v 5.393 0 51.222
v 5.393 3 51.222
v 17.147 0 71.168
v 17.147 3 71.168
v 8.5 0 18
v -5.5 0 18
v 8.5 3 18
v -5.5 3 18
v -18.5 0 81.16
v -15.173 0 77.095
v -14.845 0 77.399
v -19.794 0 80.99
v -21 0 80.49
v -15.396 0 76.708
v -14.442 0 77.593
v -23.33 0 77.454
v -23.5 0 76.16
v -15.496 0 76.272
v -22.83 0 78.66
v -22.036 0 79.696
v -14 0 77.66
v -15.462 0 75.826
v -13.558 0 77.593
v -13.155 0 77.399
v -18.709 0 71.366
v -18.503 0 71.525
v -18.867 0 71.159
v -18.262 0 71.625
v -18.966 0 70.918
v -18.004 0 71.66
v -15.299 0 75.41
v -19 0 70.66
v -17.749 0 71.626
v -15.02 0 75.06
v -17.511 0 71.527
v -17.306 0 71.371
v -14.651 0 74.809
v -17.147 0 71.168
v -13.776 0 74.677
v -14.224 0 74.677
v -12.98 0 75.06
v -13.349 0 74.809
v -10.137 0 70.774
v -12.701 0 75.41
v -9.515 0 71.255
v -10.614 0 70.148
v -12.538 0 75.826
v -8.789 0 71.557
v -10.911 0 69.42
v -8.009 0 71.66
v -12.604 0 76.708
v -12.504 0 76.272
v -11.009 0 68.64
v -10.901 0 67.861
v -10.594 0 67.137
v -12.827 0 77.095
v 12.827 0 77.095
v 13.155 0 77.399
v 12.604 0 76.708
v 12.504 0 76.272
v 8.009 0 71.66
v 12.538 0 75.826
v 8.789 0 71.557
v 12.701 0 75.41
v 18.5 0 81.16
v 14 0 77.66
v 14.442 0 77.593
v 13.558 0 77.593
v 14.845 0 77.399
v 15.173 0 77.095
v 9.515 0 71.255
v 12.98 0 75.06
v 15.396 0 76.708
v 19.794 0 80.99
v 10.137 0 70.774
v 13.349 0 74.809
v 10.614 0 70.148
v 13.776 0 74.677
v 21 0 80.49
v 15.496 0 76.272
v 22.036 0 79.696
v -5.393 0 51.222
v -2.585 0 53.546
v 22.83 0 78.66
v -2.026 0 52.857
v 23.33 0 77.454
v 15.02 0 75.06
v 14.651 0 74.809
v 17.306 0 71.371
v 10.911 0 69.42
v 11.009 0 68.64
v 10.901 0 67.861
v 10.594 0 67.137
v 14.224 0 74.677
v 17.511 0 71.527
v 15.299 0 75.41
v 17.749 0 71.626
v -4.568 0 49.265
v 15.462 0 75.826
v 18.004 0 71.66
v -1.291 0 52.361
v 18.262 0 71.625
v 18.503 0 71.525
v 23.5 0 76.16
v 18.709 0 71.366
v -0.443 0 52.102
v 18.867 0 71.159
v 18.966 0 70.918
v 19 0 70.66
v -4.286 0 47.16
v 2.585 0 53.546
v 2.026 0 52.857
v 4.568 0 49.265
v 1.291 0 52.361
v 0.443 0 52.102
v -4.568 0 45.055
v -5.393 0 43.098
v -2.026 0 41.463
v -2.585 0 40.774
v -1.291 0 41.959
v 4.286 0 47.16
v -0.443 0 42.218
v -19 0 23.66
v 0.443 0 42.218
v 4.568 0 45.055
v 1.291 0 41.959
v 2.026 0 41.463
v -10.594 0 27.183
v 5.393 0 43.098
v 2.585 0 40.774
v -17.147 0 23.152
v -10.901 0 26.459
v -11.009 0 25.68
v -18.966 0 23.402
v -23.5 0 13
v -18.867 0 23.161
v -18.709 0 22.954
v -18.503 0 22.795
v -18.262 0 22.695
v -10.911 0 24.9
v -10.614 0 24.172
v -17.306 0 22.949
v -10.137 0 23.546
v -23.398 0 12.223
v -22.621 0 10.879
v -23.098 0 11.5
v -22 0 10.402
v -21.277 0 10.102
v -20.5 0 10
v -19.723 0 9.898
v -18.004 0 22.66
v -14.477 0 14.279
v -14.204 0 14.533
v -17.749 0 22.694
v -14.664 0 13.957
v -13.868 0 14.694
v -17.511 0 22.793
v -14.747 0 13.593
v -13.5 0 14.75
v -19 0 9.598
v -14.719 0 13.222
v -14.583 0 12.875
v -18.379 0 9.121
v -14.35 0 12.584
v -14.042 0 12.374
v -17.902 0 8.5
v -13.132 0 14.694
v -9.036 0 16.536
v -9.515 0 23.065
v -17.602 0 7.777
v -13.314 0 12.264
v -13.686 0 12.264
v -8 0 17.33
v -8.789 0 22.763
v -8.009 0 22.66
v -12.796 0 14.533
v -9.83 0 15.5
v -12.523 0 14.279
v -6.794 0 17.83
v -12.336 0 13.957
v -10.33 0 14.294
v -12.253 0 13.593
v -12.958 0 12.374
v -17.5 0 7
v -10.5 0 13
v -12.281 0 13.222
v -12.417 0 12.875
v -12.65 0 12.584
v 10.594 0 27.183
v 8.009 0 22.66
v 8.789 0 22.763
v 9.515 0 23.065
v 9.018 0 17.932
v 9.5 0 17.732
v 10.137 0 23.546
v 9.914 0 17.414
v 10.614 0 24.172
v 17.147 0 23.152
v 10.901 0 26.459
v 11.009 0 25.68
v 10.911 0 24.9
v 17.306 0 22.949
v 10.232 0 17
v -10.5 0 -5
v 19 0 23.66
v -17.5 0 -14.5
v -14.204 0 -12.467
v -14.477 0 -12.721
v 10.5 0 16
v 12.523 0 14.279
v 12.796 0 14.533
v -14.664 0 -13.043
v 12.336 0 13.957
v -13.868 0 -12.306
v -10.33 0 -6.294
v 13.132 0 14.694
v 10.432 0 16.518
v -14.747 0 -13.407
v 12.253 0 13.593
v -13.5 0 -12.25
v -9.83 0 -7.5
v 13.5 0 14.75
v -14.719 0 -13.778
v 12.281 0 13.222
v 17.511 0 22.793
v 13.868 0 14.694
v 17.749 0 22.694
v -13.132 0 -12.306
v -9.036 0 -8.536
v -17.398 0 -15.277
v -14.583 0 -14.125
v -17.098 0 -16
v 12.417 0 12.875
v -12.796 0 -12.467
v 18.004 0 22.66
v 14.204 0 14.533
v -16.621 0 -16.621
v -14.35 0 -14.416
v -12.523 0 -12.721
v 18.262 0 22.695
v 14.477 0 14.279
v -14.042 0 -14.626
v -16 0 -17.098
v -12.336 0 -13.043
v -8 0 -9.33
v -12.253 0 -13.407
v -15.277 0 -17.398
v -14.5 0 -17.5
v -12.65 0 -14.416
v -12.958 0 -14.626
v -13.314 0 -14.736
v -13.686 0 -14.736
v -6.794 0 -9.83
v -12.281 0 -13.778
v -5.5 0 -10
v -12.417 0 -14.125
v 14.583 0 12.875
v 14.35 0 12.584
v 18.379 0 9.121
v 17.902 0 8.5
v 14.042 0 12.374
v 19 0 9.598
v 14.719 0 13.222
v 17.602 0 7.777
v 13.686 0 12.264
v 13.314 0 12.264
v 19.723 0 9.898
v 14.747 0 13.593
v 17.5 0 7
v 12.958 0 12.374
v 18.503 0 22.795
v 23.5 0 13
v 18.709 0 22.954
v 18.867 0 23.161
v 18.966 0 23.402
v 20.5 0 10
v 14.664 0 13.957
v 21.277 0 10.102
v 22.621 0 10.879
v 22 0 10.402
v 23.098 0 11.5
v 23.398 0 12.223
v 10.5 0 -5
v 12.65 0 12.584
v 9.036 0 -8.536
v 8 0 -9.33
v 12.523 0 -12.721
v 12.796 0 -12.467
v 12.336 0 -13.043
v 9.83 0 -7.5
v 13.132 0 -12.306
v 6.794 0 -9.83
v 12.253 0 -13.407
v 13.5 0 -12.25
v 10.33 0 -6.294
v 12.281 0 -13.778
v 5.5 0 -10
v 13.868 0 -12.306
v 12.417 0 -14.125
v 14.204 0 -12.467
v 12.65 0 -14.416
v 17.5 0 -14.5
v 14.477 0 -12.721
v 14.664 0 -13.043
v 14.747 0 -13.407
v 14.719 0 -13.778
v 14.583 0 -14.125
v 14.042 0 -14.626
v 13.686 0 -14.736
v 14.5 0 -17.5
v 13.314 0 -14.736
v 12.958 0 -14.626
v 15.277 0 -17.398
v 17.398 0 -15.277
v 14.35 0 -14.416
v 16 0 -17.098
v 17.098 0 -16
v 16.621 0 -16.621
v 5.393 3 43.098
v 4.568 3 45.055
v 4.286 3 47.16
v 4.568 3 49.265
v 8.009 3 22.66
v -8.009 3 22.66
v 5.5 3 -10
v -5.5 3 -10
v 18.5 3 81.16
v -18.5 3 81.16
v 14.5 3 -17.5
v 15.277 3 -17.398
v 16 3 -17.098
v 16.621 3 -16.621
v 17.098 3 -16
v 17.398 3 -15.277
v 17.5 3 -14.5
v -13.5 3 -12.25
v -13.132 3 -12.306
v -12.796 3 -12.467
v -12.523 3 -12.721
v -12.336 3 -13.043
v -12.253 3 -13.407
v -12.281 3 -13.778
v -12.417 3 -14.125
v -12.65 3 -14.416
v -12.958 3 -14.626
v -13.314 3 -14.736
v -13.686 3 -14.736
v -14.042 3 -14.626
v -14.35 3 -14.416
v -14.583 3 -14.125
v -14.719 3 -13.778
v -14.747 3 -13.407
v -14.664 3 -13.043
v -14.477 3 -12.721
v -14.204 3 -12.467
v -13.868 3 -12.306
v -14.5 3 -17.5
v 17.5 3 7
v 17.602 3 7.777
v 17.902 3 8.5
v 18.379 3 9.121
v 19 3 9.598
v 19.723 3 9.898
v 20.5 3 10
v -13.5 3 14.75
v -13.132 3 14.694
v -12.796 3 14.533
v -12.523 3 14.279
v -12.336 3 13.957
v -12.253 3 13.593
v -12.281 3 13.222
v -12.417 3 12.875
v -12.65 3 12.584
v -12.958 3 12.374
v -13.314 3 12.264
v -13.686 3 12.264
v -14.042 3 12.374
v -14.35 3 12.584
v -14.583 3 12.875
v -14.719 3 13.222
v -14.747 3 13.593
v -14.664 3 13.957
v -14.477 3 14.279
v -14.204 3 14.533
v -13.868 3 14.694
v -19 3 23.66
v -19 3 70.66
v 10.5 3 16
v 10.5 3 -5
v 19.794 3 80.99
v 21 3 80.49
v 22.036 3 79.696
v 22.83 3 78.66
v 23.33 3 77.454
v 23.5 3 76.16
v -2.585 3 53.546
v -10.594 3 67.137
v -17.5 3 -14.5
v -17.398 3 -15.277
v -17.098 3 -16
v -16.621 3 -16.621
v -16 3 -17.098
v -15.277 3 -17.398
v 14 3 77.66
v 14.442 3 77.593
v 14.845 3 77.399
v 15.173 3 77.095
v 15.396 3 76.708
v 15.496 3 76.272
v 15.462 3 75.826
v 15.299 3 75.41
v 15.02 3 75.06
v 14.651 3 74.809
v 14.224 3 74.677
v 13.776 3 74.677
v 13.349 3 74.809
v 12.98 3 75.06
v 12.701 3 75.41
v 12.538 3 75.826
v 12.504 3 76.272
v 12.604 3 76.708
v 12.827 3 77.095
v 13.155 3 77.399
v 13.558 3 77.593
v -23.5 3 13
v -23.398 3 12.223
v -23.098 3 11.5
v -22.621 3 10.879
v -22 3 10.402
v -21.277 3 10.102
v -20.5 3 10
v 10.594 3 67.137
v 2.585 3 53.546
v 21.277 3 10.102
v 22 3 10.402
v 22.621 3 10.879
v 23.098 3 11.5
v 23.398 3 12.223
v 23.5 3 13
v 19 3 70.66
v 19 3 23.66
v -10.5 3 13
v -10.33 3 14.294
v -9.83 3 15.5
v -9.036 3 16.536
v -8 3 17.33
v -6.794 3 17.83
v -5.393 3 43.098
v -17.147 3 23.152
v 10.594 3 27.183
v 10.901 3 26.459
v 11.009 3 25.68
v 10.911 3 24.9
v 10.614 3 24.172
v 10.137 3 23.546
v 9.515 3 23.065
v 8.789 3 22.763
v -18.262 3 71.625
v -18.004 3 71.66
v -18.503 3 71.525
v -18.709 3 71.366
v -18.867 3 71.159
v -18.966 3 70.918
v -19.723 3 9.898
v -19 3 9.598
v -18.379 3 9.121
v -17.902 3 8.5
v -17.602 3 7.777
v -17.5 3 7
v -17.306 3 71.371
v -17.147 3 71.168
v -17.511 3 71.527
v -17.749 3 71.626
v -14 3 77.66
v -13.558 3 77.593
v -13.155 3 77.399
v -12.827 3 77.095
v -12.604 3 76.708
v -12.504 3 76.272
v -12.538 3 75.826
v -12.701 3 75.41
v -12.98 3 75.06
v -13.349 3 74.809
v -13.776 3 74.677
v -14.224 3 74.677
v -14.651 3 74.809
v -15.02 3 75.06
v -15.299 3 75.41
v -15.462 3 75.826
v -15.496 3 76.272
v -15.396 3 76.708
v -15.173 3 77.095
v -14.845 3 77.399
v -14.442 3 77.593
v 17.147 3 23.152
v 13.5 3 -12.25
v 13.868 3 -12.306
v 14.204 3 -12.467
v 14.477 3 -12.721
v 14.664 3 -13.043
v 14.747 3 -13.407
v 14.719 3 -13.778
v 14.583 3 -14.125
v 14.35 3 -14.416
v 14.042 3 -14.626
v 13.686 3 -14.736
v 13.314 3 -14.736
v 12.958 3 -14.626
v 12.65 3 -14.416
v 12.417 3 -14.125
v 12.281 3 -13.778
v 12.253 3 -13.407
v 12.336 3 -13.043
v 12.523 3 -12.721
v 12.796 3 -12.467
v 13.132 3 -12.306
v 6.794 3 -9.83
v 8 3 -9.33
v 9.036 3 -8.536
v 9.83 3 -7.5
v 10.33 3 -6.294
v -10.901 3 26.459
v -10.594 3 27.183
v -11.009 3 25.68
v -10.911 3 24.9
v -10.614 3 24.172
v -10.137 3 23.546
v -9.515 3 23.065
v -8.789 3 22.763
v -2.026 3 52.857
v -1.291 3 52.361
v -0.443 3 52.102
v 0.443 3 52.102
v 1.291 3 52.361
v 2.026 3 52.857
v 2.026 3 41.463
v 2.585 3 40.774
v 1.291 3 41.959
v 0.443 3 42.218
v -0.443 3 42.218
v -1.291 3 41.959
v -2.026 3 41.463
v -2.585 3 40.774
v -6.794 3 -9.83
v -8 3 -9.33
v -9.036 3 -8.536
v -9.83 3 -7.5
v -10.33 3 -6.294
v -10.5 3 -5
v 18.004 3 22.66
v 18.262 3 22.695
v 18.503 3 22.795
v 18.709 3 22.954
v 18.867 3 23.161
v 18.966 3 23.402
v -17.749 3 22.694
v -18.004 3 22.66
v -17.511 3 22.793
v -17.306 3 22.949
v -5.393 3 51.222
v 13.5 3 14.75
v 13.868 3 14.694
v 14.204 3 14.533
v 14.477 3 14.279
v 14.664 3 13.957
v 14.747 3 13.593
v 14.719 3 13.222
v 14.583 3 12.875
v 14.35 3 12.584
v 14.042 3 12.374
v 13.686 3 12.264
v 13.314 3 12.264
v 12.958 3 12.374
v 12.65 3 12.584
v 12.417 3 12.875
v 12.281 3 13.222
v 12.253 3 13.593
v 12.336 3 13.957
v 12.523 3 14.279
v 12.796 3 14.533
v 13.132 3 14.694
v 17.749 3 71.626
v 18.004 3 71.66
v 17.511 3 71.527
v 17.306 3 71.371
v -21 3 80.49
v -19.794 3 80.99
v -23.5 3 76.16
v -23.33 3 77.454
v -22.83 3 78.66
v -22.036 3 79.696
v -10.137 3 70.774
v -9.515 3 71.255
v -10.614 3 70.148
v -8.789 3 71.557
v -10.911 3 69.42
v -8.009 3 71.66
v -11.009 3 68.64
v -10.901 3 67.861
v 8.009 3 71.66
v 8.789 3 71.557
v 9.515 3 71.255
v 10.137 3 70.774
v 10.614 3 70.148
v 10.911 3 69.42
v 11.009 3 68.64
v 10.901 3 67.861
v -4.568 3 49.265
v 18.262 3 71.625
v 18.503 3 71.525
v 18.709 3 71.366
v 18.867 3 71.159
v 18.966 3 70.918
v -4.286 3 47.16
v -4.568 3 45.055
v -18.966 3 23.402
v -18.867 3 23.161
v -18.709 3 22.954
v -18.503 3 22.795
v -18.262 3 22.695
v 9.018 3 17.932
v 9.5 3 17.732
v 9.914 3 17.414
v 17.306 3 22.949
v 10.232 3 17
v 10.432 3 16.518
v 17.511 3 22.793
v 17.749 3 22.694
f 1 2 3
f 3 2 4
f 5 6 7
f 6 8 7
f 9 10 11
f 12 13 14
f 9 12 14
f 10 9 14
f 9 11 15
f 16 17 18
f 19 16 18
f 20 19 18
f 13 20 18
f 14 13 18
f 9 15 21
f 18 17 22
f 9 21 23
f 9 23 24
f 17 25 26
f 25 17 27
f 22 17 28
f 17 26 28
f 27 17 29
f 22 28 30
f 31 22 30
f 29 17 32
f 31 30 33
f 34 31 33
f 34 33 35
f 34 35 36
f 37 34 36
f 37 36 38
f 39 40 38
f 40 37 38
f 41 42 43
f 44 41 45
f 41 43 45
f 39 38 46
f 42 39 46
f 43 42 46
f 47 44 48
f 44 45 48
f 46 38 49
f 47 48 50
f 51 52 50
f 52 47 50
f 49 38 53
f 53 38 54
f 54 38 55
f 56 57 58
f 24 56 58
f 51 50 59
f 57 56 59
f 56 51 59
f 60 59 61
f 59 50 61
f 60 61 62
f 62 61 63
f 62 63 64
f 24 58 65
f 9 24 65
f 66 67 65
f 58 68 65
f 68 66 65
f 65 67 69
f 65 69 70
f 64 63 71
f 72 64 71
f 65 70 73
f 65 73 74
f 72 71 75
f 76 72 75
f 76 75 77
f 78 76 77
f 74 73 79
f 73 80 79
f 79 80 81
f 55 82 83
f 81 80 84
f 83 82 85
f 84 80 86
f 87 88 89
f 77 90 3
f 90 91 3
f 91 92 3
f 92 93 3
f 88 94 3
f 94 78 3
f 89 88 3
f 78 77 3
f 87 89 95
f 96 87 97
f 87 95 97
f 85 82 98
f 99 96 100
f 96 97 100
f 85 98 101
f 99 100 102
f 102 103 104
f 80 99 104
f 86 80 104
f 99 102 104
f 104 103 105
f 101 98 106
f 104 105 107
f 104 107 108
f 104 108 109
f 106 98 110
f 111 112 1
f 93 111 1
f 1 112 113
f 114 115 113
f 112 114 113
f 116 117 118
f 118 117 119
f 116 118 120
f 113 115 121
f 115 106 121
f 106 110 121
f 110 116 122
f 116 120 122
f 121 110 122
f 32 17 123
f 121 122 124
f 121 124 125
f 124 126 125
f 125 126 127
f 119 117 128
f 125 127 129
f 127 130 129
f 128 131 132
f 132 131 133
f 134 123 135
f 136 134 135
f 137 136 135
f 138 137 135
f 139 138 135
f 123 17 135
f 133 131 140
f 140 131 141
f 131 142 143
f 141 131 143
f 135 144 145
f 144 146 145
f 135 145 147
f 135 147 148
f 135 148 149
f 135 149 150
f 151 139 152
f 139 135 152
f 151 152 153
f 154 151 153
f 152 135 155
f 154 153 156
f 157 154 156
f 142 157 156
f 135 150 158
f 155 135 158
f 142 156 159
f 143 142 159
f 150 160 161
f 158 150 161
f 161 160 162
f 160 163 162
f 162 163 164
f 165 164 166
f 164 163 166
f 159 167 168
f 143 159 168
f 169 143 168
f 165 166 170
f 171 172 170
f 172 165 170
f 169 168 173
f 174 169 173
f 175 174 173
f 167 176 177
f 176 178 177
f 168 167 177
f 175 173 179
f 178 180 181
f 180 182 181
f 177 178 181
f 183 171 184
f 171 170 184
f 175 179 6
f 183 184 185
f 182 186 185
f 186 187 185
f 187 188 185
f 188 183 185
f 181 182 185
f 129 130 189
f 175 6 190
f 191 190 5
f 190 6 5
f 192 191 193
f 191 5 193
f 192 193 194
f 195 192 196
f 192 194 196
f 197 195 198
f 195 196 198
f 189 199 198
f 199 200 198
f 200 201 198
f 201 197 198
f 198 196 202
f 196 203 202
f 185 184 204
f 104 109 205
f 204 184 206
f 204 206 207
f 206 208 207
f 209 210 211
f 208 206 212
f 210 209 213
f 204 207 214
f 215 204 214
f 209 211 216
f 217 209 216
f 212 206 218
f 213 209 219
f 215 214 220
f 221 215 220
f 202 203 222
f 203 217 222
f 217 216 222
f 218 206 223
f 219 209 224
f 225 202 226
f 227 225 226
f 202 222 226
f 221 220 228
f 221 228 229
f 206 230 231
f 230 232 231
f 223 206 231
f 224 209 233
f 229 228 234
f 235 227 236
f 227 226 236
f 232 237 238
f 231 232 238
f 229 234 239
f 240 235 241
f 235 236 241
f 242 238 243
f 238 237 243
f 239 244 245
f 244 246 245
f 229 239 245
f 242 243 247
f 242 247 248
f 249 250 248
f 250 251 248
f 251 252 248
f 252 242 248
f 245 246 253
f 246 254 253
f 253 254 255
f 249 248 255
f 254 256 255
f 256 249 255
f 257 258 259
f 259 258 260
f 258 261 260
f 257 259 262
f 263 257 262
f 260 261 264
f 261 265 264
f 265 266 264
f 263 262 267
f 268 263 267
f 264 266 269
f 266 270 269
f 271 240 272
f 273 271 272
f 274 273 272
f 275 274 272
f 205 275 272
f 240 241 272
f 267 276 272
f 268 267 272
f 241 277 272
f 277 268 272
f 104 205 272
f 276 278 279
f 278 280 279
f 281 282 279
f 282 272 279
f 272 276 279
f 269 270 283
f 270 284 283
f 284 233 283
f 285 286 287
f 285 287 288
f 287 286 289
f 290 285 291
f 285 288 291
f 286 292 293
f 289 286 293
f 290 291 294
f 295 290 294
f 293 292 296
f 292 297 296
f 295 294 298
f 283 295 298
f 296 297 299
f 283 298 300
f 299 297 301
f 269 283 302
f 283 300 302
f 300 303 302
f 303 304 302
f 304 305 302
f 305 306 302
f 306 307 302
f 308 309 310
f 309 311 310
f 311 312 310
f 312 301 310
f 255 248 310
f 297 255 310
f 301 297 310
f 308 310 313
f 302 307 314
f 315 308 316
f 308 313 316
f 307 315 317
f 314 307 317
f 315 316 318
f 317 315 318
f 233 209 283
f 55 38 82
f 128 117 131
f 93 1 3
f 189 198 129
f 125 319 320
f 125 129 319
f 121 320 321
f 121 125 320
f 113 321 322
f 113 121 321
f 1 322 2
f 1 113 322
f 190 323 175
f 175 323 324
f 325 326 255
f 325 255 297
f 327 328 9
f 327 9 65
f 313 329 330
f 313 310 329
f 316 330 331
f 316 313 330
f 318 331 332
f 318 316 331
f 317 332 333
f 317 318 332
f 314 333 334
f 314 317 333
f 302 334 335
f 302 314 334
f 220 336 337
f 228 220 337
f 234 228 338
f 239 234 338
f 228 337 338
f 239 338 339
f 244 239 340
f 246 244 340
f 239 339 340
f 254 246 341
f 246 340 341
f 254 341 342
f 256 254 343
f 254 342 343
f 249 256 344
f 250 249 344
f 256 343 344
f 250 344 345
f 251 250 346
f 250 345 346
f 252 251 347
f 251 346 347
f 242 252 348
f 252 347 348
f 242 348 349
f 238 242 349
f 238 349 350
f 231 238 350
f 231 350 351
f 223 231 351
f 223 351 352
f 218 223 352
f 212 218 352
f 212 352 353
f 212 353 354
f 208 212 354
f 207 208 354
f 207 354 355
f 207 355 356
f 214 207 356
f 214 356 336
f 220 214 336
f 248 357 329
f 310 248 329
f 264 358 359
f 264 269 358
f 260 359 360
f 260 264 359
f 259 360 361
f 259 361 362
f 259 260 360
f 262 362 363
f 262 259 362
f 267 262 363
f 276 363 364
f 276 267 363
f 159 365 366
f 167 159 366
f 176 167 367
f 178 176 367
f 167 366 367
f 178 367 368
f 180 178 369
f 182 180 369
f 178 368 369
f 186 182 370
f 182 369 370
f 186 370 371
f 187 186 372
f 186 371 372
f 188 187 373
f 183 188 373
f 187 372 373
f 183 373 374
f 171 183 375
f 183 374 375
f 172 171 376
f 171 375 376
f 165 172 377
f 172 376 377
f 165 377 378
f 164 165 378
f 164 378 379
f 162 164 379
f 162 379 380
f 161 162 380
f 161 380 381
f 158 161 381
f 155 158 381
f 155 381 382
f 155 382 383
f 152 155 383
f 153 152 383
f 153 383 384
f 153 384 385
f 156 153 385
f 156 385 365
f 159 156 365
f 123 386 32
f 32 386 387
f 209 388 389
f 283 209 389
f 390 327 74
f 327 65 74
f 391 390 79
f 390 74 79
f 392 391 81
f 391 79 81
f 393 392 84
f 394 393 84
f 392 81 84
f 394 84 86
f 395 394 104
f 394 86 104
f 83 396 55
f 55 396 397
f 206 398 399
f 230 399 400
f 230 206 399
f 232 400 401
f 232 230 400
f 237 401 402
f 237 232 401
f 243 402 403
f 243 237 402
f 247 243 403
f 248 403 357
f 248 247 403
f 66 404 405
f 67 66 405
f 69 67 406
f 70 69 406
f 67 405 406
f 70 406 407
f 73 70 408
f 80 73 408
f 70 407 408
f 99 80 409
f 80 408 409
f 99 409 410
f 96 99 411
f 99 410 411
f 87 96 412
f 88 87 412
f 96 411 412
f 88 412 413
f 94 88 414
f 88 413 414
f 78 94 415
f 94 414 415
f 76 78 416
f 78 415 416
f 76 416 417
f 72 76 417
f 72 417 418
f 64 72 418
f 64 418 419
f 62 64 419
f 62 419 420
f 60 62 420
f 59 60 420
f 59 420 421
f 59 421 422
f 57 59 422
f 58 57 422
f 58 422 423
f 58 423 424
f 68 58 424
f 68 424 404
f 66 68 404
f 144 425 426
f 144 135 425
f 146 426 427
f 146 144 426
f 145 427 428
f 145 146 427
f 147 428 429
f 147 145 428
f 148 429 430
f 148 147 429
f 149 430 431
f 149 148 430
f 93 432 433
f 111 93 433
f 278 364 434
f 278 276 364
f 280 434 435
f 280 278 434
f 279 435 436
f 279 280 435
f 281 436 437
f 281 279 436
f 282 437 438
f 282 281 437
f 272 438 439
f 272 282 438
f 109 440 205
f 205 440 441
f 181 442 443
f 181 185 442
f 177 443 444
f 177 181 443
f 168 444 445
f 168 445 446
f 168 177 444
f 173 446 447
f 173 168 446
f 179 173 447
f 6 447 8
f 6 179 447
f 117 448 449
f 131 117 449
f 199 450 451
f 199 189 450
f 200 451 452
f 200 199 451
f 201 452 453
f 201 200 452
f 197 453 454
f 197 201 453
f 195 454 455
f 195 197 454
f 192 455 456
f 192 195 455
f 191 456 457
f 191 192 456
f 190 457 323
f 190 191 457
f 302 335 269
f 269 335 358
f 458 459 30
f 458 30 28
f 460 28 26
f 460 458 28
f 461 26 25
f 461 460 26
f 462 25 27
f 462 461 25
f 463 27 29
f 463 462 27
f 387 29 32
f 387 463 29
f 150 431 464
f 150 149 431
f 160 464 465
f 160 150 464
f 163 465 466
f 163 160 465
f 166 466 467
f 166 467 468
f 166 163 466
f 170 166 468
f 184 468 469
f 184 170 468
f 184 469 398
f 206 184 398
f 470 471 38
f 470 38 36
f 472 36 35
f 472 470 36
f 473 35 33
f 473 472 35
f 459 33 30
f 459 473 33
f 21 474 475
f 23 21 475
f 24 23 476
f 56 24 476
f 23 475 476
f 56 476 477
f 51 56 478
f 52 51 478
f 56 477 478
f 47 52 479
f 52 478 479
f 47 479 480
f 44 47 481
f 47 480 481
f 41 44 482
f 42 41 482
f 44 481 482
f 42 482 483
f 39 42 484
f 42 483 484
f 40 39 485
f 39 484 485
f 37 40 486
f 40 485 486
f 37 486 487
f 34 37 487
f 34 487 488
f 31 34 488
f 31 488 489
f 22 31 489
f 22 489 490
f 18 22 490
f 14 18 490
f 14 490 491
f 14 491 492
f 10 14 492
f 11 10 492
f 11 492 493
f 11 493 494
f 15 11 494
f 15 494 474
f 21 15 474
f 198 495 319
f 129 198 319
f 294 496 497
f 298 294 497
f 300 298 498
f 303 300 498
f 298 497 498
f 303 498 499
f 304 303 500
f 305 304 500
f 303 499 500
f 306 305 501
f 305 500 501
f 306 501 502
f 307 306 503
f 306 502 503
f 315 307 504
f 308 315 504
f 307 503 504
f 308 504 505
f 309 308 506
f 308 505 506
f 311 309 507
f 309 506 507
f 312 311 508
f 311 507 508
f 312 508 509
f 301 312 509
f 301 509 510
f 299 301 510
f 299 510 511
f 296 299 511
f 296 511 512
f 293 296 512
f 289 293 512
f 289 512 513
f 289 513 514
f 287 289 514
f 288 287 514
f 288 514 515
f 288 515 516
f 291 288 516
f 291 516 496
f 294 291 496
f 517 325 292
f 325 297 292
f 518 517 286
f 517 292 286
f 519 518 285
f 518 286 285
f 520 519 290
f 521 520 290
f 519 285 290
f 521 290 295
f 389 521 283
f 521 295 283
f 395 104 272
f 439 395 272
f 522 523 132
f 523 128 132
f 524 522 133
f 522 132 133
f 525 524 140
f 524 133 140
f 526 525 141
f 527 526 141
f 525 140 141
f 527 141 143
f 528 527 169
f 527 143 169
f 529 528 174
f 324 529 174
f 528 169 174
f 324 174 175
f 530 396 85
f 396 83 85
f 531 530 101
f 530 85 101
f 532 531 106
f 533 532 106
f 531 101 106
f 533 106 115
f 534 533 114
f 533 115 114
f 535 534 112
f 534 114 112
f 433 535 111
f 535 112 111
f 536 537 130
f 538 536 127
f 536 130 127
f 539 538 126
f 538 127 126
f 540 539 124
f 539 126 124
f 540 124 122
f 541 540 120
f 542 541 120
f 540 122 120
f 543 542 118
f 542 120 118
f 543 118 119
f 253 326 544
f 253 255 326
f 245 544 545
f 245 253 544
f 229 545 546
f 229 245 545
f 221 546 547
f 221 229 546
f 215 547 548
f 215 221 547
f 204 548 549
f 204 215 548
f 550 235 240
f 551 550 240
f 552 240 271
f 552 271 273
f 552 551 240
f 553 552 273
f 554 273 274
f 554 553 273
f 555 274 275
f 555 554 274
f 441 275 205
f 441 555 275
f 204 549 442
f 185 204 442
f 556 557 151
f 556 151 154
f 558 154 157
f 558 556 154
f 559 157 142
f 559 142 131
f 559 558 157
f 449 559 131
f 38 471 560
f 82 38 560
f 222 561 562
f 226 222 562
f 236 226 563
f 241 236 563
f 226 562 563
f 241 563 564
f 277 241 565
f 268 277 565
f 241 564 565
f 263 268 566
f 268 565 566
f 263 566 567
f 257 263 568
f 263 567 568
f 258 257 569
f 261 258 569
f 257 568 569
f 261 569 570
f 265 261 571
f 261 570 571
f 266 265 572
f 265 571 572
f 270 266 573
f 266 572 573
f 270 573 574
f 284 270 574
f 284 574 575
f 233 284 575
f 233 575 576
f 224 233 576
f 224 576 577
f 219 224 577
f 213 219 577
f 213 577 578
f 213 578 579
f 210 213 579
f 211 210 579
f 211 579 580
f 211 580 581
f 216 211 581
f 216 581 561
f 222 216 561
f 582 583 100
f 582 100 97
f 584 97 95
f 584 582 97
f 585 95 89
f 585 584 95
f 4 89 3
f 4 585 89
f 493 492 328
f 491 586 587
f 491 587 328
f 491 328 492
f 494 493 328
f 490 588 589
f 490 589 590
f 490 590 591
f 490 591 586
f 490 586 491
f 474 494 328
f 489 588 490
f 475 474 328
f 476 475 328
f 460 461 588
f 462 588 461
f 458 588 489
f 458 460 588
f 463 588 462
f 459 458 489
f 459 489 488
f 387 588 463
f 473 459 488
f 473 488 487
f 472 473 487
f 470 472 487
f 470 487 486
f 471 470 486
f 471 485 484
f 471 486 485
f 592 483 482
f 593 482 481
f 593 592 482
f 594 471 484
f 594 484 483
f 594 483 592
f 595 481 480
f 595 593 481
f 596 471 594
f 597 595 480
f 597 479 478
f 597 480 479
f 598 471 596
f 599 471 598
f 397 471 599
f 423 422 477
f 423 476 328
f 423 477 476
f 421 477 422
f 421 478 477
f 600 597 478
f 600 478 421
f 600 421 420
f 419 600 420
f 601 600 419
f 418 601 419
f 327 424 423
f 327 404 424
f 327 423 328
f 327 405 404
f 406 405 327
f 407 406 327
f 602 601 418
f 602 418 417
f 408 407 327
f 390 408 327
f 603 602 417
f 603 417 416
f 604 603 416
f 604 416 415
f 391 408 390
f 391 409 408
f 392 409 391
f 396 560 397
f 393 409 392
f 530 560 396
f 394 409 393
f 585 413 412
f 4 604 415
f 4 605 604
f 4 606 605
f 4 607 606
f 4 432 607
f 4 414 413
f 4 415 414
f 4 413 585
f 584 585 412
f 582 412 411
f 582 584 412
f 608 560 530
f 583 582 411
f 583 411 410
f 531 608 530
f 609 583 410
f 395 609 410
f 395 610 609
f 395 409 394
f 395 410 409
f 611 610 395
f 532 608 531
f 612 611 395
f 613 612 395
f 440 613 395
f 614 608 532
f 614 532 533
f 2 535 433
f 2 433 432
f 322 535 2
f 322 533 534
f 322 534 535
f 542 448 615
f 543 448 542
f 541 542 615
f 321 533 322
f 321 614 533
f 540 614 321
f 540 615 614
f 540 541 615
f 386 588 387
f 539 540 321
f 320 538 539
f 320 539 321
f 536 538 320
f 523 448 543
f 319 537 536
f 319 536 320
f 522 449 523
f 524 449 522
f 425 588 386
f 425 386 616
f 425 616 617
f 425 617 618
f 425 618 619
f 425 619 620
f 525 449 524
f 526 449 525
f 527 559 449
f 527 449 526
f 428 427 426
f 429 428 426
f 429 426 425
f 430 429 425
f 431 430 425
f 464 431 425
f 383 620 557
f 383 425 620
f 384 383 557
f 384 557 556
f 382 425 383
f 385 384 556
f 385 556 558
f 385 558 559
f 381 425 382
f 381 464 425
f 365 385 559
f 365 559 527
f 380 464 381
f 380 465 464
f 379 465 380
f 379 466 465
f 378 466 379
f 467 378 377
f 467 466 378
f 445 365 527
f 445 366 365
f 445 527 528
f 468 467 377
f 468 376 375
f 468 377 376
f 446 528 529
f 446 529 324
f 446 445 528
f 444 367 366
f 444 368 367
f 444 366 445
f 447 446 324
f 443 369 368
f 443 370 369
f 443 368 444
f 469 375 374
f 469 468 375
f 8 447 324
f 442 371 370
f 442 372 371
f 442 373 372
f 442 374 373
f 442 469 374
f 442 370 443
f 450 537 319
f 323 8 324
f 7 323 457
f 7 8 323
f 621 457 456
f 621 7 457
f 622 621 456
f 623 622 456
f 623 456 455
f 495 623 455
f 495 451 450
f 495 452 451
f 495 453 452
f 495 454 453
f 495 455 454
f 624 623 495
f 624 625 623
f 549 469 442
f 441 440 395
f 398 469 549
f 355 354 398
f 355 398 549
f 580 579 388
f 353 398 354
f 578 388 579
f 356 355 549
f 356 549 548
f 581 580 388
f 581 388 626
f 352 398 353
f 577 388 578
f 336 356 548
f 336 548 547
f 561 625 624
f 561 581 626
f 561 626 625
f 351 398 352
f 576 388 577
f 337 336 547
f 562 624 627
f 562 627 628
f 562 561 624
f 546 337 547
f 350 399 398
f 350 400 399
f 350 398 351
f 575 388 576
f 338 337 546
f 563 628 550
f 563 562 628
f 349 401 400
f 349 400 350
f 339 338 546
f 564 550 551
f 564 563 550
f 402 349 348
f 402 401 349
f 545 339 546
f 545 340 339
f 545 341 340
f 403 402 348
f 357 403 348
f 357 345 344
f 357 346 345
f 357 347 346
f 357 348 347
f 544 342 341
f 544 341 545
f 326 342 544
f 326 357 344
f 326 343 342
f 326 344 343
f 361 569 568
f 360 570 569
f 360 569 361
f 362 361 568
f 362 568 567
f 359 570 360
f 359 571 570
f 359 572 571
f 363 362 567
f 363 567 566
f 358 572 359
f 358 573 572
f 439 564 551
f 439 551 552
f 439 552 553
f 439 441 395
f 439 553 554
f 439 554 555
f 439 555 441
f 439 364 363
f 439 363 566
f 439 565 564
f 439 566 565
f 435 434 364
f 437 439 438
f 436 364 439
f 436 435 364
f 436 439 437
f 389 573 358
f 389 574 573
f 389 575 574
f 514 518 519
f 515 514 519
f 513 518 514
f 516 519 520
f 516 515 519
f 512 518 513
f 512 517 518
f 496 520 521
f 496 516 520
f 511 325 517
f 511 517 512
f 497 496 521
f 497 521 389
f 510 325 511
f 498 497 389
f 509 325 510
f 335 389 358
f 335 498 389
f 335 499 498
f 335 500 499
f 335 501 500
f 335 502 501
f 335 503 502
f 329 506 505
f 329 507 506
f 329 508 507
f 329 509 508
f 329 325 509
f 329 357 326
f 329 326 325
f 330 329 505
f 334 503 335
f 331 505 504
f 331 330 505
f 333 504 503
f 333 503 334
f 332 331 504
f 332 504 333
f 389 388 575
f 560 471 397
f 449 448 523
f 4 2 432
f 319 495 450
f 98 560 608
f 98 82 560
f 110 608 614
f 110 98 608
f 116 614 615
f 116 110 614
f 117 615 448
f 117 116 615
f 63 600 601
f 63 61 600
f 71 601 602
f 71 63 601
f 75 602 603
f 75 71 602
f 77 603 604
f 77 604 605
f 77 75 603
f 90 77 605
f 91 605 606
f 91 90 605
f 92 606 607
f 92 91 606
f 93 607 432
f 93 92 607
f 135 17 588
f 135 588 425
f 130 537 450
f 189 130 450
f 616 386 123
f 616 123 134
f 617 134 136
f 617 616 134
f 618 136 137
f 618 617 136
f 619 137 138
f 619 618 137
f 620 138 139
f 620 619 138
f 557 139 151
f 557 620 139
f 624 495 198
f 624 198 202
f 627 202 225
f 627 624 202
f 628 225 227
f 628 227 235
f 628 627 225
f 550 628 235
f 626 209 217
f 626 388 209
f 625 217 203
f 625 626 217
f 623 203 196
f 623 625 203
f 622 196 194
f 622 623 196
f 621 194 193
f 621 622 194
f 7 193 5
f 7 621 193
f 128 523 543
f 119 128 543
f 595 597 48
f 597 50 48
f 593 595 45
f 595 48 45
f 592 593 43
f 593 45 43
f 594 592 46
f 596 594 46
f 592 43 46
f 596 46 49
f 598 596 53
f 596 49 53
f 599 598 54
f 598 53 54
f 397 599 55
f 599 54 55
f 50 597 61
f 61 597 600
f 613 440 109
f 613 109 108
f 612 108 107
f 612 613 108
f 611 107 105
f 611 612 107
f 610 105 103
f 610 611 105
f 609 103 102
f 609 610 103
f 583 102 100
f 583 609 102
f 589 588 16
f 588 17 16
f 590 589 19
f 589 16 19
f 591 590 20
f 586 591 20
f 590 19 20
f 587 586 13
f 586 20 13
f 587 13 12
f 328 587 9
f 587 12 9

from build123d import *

# Parameters (mm, degrees)
SKETCH_1_W          = 47
SKETCH_1_H          = 106.16
SKETCH_1_W_2        = 10.5
SKETCH_1_H_2        = 10
EXTRUDE_1_DEPTH     = 3
SKETCH_4_R          = 1.5
SKETCH_4_W          = 47
SKETCH_4_H          = 5
CUT_EXTRUDE_2_DEPTH = 4
SKETCH_10_R         = 1.25
CUT_EXTRUDE_4_DEPTH = 10
SKETCH_16_W         = 17.5
SKETCH_16_H         = 2.5
CUT_EXTRUDE_5_DEPTH = 10
FILLET_1_R          = 3
CUT_EXTRUDE_7_DEPTH = 10
FILLET_2_R          = 1
FILLET_3_R          = 8
FILLET_4_R          = 3
FILLET_5_R          = 5
SKETCH_17_W         = 21
SKETCH_17_H         = 20
SKETCH_17_H_2       = 8
CUT_EXTRUDE_8_DEPTH = 10
FILLET_6_R          = 5
FILLET_7_R          = 2


# Some blends are built 0.0001 mm under size
with BuildPart() as part:
    # 草图1 → 凸台-拉伸1 (new body)
    with BuildSketch(Plane(origin=(0, 0, 0), x_dir=(1, 0, 0), z_dir=(0, 1, 0))):
        with Locations((0, -33.08)):
            Rectangle(SKETCH_1_W, SKETCH_1_H)
        with Locations((5.25, -13)):
            Rectangle(SKETCH_1_W_2, SKETCH_1_H_2, mode=Mode.SUBTRACT)
    extrude(amount=EXTRUDE_1_DEPTH)

    # 草图4 → 切除-拉伸2 (cut)
    with BuildSketch(Plane(origin=(0, 3, 0), x_dir=(1, 0, 0), z_dir=(0, 1, 0))):
        with Locations(Location((-14, -76.16, 0), (0, 0, 270))):
            Circle(SKETCH_4_R)
        with Locations(Location((14, -76.16, 0), (0, 0, 270))):
            Circle(SKETCH_4_R)
        with Locations((0, -83.66)):
            Rectangle(SKETCH_4_W, SKETCH_4_H)
    extrude(amount=-CUT_EXTRUDE_2_DEPTH, mode=Mode.SUBTRACT)

    # 草图10 → 切除-拉伸4 (cut)
    with BuildSketch(Plane(origin=(0, 3, 0), x_dir=(1, 0, 0), z_dir=(0, 1, 0))):
        with Locations(Location((13.5, 13.5, 0), (0, 0, 270))):
            Circle(SKETCH_10_R)
        with Locations(Location((13.5, -13.5, 0), (0, 0, 270))):
            Circle(SKETCH_10_R)
        with Locations(Location((-13.5, -13.5, 0), (0, 0, 270))):
            Circle(SKETCH_10_R)
        with Locations(Location((-13.5, 13.5, 0), (0, 0, 270))):
            Circle(SKETCH_10_R)
    extrude(amount=-CUT_EXTRUDE_4_DEPTH, mode=Mode.SUBTRACT)

    # 草图16 → 切除-拉伸5 (cut)
    with BuildSketch(Plane(origin=(0, 3, 0), x_dir=(1, 0, 0), z_dir=(0, 1, 0))):
        Polygon((-17.5, 17.5), (-17.5, 20), (-23.5, 20), (-23.5, -10), (-17.5, -10), align=None)
        Polygon((23.5, 20), (17.5, 20), (17.5, 17.5), (17.5, -10), (23.5, -10), align=None)
        with Locations((8.75, 18.75)):
            Rectangle(SKETCH_16_W, SKETCH_16_H)
        with Locations((-8.75, 18.75)):
            Rectangle(SKETCH_16_W, SKETCH_16_H)
    extrude(amount=-CUT_EXTRUDE_5_DEPTH, mode=Mode.SUBTRACT)

    # 圆角1
    fillet_1_edges = [part.edges().sort_by_distance(p)[0] for p in [
        (-17.5, 1.5, -17.5),
        (17.5, 1.5, -17.5),
        (23.5, 1.5, 10),
        (-23.5, 1.5, 10),
        (17.5, 1.5, 10),
        (-17.5, 1.5, 10),
    ]]
    fillet(fillet_1_edges, radius=FILLET_1_R - 0.0001)  # a hair under: the kernel refuses the full size

    # 草图9 → 切除-拉伸7 (cut)
    with BuildSketch(Plane(origin=(0, 3, 0), x_dir=(1, 0, 0), z_dir=(0, 1, 0))):
        Polygon((-3, -47.16), (-17.4375, -22.66), (-19, -22.66), (-19, -71.66), (-17.4375, -71.66), align=None)
        Polygon((0, -45.16), (13.258928571, -22.66), (-13.258928571, -22.66), align=None)
        Polygon((19, -22.66), (17.4375, -22.66), (3, -47.16), (17.4375, -71.66), (19, -71.66), align=None)
        Polygon((-13.258928571, -71.66), (13.258928571, -71.66), (0, -49.16), align=None)
    extrude(amount=-CUT_EXTRUDE_7_DEPTH, mode=Mode.SUBTRACT)

    # 圆角2
    # the kernel refuses this fillet: 1 mm, written as the material it adds along each edge
    with BuildSketch(Plane(origin=(-17.4375, 3, 71.66), x_dir=(-1, 0, 0), z_dir=(0, -1, 0)), Plane(origin=(17.4375, 3, 71.66), x_dir=(-0.507692307692314, 0, -0.8615384615384579), z_dir=(0, -1, 0)), Plane(origin=(17.4375, 3, 22.66), x_dir=(1, 0, 0), z_dir=(0, -1, 0)), Plane(origin=(-17.4375, 3, 22.66), x_dir=(0.5076923076923058, 0, 0.8615384615384627), z_dir=(0, -1, 0))) as fillet_2_piece_1:
        with BuildLine():
            CenterArc((FILLET_2_R * 0.571428571429, FILLET_2_R), FILLET_2_R, 210.510237406, 59.489762594)
            Line((-FILLET_2_R * 0.29010989011, FILLET_2_R * 0.492307692308), (0, 0))
            Line((0, 0), (FILLET_2_R * 0.571428571429, 0))
        make_face()
    extrude(amount=3)
    with BuildSketch(Plane(origin=(-19, 3, 71.66), x_dir=(0, 0, -1), z_dir=(0, -1, 0)), Plane(origin=(19, 3, 71.66), x_dir=(-1, 0, 0), z_dir=(0, -1, 0)), Plane(origin=(-19, 3, 22.66), x_dir=(1, 0, 0), z_dir=(0, -1, 0))) as fillet_2_piece_2:
        with BuildLine():
            CenterArc((FILLET_2_R, FILLET_2_R), FILLET_2_R, 180, 90)
            Line((0, FILLET_2_R), (0, 0))
            Line((0, 0), (FILLET_2_R, 0))
        make_face()
    extrude(amount=3)
    with BuildSketch(Plane(origin=(19, 3, 22.66), x_dir=(-1, 0, 0), z_dir=(0, -1, 0))) as fillet_2_piece_3:
        with BuildLine():
            CenterArc((FILLET_2_R, -FILLET_2_R), FILLET_2_R, 90, 90)
            Line((0, -FILLET_2_R), (0, 0))
            Line((0, 0), (FILLET_2_R, 0))
        make_face()
    extrude(amount=3)

    # 圆角3
    fillet_3_edges = [part.edges().sort_by_distance(p)[0] for p in [
        (3, 1.5, 47.16),
        (-3, 1.5, 47.16),
    ]]
    fillet(fillet_3_edges, radius=FILLET_3_R)

    # 圆角4
    fillet_4_edges = [part.edges().sort_by_distance(p)[0] for p in [
        (-13.258928571, 1.5, 22.66),
        (13.258928571, 1.5, 22.66),
        (0, 1.5, 45.16),
        (-13.258928571, 1.5, 71.66),
        (0, 1.5, 49.16),
        (13.258928571, 1.5, 71.66),
    ]]
    fillet(fillet_4_edges, radius=FILLET_4_R)

    # 圆角5
    fillet_5_edges = [part.edges().sort_by_distance(p)[0] for p in [
        (-23.5, 1.5, 81.16),
        (23.5, 1.5, 81.16),
    ]]
    fillet(fillet_5_edges, radius=FILLET_5_R)

    # 草图17 → 切除-拉伸8 (cut)
    with BuildSketch(Plane(origin=(0, 3, 0), x_dir=(1, 0, 0), z_dir=(0, 1, 0))):
        Rectangle(SKETCH_17_W, SKETCH_17_H)
        with Locations((0, -14)):
            Rectangle(SKETCH_17_W, SKETCH_17_H_2)
    extrude(amount=-CUT_EXTRUDE_8_DEPTH, mode=Mode.SUBTRACT)

    # 圆角6
    fillet_6_edges = [part.edges().sort_by_distance(p)[0] for p in [
        (-10.5, 1.5, 18),
        (-10.5, 1.5, -10),
        (10.5, 1.5, -10),
    ]]
    fillet(fillet_6_edges, radius=FILLET_6_R)

    # 圆角7
    fillet_7_edges = [part.edges().sort_by_distance(p)[0] for p in [
        (10.5, 1.5, 18),
    ]]
    fillet(fillet_7_edges, radius=FILLET_7_R)


solid = part.part
